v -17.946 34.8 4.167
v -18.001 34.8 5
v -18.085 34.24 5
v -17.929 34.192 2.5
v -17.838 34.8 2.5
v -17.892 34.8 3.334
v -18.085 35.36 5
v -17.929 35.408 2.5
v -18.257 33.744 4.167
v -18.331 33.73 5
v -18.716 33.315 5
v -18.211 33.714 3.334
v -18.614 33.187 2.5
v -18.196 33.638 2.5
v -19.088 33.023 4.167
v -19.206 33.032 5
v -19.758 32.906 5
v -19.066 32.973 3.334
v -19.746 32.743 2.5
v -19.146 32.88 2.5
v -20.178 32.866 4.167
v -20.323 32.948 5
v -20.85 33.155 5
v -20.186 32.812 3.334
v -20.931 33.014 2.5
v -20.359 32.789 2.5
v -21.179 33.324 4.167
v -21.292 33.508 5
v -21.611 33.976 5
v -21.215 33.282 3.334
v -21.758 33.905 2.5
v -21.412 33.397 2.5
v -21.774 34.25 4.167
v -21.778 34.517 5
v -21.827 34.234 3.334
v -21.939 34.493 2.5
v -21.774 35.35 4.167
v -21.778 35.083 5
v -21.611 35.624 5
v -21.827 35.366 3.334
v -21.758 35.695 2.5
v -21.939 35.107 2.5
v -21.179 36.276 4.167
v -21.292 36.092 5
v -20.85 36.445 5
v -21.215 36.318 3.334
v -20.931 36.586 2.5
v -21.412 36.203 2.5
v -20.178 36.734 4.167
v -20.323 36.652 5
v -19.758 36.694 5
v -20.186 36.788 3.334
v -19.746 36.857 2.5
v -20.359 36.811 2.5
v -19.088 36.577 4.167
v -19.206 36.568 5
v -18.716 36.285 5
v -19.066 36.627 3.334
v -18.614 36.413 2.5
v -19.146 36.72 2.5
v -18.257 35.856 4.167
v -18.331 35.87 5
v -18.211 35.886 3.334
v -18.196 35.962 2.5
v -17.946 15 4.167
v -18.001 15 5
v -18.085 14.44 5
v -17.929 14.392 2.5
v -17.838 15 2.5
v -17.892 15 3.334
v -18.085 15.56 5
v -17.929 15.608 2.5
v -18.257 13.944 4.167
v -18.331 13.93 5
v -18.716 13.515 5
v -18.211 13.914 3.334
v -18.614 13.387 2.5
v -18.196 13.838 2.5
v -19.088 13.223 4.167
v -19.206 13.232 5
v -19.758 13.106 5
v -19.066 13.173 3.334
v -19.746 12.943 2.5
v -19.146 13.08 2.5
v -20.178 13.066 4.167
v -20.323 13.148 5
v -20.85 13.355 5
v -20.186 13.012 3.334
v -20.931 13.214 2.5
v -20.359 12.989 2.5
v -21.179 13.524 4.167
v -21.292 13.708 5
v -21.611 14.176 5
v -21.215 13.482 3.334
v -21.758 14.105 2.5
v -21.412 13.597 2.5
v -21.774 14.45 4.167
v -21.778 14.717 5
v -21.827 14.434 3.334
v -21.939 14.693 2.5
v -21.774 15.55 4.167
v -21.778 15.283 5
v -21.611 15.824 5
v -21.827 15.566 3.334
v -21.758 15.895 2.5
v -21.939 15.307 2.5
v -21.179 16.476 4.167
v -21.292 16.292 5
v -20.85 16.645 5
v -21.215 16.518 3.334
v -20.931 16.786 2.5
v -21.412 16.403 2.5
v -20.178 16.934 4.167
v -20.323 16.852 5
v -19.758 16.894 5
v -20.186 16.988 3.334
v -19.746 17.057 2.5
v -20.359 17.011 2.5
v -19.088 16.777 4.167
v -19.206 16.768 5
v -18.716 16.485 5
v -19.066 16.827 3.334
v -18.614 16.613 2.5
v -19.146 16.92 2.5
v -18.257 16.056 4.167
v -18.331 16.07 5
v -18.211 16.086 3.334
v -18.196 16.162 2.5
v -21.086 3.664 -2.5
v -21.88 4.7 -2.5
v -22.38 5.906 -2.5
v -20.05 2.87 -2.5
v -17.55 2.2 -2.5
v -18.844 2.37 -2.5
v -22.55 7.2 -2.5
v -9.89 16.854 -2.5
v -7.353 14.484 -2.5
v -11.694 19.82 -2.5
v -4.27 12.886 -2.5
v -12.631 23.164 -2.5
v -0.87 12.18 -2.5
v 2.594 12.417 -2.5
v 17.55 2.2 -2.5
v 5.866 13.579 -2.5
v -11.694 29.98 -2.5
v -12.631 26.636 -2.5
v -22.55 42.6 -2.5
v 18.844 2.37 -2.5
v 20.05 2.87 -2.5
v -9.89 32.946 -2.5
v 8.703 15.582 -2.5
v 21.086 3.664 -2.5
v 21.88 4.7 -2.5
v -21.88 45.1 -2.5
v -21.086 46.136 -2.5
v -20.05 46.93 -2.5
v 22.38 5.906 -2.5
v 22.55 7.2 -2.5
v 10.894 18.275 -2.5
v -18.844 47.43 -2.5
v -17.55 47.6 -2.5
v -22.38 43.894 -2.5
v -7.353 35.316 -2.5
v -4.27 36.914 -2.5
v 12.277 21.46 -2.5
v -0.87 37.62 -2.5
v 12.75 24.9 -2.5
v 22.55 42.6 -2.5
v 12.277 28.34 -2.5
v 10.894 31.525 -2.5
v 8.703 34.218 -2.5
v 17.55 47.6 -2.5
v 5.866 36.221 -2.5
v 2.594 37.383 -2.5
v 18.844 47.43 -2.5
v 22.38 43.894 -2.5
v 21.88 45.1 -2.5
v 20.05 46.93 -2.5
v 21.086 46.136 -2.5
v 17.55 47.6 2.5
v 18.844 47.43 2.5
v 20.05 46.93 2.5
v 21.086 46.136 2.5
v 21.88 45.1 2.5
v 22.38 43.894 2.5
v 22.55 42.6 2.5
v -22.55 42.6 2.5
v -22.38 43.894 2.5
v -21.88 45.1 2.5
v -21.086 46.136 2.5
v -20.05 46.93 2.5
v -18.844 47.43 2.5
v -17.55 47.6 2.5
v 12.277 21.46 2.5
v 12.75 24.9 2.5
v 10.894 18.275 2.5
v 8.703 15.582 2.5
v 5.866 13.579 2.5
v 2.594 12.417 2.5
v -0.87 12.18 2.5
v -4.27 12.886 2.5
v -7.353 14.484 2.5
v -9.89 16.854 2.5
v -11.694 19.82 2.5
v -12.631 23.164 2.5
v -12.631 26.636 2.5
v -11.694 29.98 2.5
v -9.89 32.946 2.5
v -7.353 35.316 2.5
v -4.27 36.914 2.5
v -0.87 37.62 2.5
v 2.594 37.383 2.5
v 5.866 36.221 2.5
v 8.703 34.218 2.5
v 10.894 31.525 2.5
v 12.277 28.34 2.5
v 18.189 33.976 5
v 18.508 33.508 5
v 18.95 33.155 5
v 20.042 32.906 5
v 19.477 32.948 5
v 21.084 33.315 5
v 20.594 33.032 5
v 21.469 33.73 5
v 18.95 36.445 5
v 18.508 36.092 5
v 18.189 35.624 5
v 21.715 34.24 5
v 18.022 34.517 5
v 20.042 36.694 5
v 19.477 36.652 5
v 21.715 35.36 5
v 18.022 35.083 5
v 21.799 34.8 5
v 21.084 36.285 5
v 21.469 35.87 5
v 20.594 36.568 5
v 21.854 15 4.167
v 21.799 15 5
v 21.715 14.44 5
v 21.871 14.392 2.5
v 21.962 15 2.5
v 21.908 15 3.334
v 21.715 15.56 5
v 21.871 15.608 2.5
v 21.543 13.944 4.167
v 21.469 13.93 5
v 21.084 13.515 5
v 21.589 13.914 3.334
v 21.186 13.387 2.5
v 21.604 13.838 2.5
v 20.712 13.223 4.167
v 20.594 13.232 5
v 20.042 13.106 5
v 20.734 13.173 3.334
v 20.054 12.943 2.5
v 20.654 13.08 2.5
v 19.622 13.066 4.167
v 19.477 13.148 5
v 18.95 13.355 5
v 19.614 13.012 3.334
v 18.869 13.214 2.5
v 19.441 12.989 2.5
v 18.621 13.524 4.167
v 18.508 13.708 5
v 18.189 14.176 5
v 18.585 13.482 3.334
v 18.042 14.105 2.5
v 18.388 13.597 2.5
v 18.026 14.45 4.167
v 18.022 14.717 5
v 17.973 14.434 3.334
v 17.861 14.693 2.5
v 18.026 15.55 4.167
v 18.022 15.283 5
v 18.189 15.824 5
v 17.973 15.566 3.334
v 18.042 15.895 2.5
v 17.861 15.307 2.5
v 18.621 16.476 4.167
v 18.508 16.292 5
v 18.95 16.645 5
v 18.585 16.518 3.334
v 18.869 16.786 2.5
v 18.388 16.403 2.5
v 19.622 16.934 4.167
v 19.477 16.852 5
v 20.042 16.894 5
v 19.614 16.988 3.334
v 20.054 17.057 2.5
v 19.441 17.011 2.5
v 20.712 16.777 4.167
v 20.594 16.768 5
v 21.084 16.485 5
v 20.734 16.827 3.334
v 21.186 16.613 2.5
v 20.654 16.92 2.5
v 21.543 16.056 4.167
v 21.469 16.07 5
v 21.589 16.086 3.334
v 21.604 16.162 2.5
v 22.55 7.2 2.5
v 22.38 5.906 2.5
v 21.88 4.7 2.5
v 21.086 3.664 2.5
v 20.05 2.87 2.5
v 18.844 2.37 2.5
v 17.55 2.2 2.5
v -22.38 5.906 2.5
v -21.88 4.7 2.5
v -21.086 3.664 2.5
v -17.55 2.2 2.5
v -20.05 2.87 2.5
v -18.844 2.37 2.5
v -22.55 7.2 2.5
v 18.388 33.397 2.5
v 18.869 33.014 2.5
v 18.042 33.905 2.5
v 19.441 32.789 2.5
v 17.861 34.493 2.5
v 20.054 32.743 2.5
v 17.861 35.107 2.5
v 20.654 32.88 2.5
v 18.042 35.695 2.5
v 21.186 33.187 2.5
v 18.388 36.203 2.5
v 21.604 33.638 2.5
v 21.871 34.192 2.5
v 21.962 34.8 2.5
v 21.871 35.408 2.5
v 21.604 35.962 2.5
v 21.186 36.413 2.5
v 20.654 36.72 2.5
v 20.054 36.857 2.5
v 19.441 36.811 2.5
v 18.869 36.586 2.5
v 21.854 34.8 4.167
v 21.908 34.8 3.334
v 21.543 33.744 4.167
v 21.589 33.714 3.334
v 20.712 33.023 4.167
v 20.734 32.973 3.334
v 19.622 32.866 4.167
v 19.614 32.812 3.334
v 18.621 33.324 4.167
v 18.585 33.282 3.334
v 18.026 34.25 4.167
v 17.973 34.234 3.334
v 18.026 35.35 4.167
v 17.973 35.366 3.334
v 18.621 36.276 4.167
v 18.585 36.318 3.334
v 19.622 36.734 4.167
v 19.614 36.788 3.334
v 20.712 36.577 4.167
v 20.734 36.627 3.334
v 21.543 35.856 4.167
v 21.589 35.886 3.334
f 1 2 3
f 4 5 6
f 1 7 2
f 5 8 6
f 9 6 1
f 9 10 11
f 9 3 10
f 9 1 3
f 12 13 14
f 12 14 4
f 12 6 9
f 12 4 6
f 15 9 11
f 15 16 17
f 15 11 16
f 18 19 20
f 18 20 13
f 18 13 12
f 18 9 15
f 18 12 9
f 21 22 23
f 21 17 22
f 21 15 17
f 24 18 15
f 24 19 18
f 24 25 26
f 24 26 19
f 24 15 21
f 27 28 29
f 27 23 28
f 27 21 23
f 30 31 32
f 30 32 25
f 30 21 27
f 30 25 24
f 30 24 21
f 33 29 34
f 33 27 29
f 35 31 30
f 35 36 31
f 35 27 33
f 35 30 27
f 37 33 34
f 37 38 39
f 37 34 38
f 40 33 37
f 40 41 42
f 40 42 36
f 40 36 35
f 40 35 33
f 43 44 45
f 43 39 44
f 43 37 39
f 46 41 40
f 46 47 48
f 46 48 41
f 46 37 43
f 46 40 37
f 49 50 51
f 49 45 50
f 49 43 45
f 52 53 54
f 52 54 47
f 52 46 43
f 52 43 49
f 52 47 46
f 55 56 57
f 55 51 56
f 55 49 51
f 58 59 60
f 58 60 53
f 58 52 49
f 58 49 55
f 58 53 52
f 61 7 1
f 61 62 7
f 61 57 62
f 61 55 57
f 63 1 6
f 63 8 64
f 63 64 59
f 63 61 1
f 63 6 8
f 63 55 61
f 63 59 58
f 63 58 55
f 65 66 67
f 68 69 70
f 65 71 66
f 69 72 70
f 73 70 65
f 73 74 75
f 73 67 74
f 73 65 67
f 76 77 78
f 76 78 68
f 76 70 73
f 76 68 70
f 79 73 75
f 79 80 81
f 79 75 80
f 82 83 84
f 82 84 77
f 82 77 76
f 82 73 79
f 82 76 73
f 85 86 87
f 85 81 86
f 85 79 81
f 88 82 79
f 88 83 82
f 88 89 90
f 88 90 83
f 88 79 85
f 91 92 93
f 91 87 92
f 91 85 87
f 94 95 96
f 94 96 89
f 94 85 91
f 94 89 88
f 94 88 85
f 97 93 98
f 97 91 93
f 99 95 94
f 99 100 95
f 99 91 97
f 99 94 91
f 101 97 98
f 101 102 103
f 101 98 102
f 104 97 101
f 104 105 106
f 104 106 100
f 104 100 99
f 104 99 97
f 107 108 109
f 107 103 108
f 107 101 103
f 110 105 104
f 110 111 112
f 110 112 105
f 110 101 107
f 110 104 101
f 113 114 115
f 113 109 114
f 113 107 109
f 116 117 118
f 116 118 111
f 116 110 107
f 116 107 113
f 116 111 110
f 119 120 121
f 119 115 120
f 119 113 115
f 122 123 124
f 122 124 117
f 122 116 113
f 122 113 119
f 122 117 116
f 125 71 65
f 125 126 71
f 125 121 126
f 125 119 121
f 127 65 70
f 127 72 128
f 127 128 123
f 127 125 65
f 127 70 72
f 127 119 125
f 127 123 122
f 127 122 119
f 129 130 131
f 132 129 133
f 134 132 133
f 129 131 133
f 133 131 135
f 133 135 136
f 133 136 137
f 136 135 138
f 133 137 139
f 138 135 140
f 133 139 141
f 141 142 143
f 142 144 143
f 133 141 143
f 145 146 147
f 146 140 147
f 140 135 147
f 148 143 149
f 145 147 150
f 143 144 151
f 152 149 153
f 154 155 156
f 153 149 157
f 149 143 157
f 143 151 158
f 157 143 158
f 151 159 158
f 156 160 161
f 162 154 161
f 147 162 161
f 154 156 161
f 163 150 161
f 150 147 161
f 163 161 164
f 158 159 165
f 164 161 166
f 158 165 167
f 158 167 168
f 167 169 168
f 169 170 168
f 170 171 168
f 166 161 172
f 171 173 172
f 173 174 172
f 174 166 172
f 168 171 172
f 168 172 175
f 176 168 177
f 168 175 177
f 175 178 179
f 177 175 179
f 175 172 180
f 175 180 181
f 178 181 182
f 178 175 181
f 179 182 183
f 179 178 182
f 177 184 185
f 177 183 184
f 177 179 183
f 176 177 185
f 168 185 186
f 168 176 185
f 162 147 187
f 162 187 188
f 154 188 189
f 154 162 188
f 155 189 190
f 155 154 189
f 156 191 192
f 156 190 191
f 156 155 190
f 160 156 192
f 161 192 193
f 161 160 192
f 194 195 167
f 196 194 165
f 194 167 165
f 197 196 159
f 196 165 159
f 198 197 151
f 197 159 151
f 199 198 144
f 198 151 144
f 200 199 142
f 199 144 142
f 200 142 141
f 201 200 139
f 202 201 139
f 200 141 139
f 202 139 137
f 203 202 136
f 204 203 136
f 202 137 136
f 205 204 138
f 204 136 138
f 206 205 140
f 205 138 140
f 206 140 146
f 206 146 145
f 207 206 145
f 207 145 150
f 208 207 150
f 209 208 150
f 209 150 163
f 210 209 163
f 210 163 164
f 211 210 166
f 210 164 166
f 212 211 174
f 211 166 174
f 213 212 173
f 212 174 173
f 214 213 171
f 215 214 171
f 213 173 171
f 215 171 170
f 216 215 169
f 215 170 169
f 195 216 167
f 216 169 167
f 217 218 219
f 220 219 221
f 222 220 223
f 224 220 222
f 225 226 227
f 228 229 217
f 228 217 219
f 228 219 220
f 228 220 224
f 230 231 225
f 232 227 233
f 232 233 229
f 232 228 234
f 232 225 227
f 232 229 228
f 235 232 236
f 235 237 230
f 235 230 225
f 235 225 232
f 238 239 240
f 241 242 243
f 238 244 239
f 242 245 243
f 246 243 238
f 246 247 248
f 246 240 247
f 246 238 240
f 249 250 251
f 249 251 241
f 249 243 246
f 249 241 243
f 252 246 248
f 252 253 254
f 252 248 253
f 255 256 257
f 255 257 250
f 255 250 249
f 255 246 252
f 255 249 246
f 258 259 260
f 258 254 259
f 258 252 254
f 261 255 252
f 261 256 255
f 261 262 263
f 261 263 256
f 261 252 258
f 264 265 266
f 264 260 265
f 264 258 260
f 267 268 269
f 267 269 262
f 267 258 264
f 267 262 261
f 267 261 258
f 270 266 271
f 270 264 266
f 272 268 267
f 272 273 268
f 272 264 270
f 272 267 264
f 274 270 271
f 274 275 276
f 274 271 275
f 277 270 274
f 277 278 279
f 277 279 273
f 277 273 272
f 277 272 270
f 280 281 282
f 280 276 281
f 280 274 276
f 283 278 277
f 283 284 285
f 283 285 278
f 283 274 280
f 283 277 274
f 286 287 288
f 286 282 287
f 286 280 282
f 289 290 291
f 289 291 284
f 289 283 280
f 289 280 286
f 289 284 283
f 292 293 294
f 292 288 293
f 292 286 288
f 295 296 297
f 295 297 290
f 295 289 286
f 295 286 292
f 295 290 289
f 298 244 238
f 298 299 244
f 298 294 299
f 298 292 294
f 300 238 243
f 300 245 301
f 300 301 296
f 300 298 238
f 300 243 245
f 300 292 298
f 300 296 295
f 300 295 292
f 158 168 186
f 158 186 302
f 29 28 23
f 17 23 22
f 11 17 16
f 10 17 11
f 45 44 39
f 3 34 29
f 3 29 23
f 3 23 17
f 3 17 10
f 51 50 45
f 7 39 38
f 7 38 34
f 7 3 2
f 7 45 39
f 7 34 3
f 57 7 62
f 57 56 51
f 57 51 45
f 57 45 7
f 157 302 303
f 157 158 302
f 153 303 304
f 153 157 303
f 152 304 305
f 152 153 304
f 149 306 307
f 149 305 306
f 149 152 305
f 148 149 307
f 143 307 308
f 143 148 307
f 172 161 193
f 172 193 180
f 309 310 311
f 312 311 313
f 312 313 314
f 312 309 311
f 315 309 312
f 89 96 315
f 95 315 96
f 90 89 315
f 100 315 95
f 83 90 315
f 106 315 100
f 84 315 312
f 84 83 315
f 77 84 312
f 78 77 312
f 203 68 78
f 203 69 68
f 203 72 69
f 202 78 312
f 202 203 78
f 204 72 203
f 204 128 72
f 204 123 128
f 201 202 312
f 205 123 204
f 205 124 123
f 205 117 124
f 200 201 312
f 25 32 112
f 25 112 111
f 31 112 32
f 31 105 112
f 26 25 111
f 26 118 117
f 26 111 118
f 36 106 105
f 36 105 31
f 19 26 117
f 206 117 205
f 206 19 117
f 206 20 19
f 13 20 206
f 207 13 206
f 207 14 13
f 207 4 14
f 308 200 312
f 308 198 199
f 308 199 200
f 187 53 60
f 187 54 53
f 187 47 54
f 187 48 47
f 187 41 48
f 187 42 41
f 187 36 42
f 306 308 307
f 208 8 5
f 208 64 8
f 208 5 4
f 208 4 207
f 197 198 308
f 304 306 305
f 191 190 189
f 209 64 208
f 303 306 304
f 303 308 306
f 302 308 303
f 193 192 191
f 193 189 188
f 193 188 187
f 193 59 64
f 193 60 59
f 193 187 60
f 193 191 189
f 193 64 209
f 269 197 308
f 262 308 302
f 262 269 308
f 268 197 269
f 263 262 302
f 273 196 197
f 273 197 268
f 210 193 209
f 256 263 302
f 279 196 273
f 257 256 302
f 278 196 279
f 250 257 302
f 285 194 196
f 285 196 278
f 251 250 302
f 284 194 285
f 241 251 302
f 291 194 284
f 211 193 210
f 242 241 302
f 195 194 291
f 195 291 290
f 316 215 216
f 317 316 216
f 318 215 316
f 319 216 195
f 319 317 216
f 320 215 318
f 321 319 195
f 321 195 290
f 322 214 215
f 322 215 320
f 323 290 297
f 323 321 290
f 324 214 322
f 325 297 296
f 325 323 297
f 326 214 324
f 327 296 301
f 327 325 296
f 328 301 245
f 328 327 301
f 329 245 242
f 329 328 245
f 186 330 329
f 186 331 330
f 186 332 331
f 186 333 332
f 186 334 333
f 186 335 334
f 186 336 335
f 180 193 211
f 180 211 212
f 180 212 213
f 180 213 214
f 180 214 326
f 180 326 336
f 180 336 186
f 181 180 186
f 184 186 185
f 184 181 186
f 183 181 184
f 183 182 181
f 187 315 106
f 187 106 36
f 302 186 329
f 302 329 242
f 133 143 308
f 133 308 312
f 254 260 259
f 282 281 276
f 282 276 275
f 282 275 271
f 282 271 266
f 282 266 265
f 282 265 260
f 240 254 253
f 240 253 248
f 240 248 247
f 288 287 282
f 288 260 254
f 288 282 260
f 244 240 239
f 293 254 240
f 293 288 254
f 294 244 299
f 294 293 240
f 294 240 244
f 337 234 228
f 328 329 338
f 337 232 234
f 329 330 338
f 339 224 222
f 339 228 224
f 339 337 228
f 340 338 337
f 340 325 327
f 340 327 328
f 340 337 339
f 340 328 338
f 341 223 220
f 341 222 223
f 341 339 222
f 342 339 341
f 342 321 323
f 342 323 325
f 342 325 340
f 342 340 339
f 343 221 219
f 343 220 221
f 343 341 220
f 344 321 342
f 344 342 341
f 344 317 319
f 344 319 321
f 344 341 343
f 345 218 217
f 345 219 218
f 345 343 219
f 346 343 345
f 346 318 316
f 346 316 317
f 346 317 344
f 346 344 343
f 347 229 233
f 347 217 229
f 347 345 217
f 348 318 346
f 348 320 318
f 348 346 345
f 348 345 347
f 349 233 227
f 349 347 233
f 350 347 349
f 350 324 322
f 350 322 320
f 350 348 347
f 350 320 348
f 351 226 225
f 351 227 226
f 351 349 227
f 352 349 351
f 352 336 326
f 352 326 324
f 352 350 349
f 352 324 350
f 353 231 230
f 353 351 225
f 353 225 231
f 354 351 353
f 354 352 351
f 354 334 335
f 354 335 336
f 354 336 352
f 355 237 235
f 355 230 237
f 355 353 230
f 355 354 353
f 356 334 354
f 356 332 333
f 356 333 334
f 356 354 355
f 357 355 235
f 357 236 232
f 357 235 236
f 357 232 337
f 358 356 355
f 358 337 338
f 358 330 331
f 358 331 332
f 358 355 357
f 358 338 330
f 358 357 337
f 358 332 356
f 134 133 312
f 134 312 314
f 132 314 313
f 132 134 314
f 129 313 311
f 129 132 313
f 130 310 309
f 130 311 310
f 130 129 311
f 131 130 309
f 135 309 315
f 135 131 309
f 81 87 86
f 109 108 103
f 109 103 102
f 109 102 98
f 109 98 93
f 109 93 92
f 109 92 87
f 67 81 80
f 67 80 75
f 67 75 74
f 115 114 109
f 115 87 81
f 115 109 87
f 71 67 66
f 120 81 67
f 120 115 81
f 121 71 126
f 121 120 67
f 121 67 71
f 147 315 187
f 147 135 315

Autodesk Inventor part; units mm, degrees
ref_plane "YZ Plane" through (0, 0, 0) normal (1, 0, 0) x (0, 1, 0)
ref_plane "XZ Plane" through (0, 0, 0) normal (0, 1, 0) x (-1, 0, 0)
ref_plane "XY Plane" through (0, 0, 0) normal (0, 0, 1) x (1, 0, 0)
sketch "Sketch1" plane through (0, 0, 0) normal (0, 0, 1) x (1, 0, 0)
  line L0 (22.9, 0.025) -> (-22.9, 0.025) projected
  line L1 (22.9, 42.1) -> (22.9, 0.025) projected
  line L2 (22.9, 42.1) -> (17.05, 42.1) projected
  line L3 (17.05, 7.7) -> (17.05, 42.1) projected
  line L4 (-17.05, 7.7) -> (17.05, 7.7) projected
  line L5 (-17.05, 7.7) -> (-17.05, 42.1) projected
  line L6 (-17.05, 42.1) -> (-22.9, 42.1) projected
  line L7 (-22.9, 0.025) -> (-22.9, 42.1) projected
  circle A0 centre (19.9, 34.8) radius 2.0625 projected
  circle A1 centre (-19.9, 34.8) radius 2.0625 projected
  circle A2 centre (19.9, 15) radius 2.0625 projected
  circle A3 centre (-19.9, 15) radius 2.0625 projected
  circle A4 centre (10, 3.85) radius 1.5625 projected
  circle A5 centre (-10, 3.85) radius 1.5625 projected
  line L8 (-17.05, 7.7) -> (17.05, 7.7)
  line L9 (17.05, 7.7) -> (17.05, 42.1)
  line L10 (17.05, 42.1) -> (-17.05, 42.1)
  line L11 (-17.05, 42.1) -> (-17.05, 7.7)
  line L12 (-17.55, 47.6) -> (17.55, 47.6)
  line L13 (22.55, 42.6) -> (22.55, 7.2)
  line L14 (17.55, 2.2) -> (-17.55, 2.2)
  line L15 (-22.55, 7.2) -> (-22.55, 42.6)
  line L16 (-22.55, 24.9) -> (22.55, 24.9)
  circle A6 centre (0, 24.9) radius 12.75
  arc A7 (-17.55, 47.6) -> (-22.55, 42.6) centre (-17.55, 42.6) ccw
  arc A8 (22.55, 42.6) -> (17.55, 47.6) centre (17.55, 42.6) ccw
  arc A9 (17.55, 2.2) -> (22.55, 7.2) centre (17.55, 7.2) ccw
  arc A10 (-22.55, 7.2) -> (-17.55, 2.2) centre (-17.55, 7.2) ccw
  point P0 (0, 0)
  dimension "d0" = 5.5
  dimension "d1" = 25.5
  dimension "d2" = 5
extrude "Extrusion1" add sketch "Sketch1" along normal mid plane 5 contours L13 L16 L3 L2 | L2 L10 L6 L15 A7 L12 A8 L13 | L6 L5 L16 L15 | L3 L16 A6 L5 L10 | L13 A9 L14 A10 L15 L16 L5 L4 L3 | L3 L4 L5 L16 A6 | A0 | A1 | A2 | A3 | A4 | A5
sketch "Sketch2" plane through (0, 0, 2.5) normal (0, 0, 1) x (1, 0, 0)
  line L0 (22.9, 0.025) -> (-22.9, 0.025) projected
  line L1 (22.9, 42.1) -> (22.9, 0.025) projected
  line L2 (22.9, 42.1) -> (17.05, 42.1) projected
  line L3 (17.05, 7.7) -> (17.05, 42.1) projected
  line L4 (-17.05, 7.7) -> (17.05, 7.7) projected
  line L5 (-17.05, 7.7) -> (-17.05, 42.1) projected
  line L6 (-17.05, 42.1) -> (-22.9, 42.1) projected
  line L7 (-22.9, 0.025) -> (-22.9, 42.1) projected
  circle A0 centre (19.9, 34.8) radius 2.0625 projected
  circle A1 centre (-19.9, 34.8) radius 2.0625 projected
  circle A2 centre (19.9, 15) radius 2.0625 projected
  circle A3 centre (-19.9, 15) radius 2.0625 projected
  circle A4 centre (10, 3.85) radius 1.5625 projected
  circle A5 centre (-10, 3.85) radius 1.5625 projected
  point P0 (0, 0)
extrude "Extrusion2" add sketch "Sketch2" along normal blind 2.5 contours A0 | A1 | A2 | A3
chamfer "Chamfer1" distance 2.5 angle 3.75 1 edges at (17.8375, 34.8, 5) measured on face at (21.7975, 35.6084, 4.1667)
chamfer "Chamfer2" distance 2.5 angle 3.75 1 edges at (17.8375, 15, 5) measured on face at (21.9358, 14.6692, 4.1667)
chamfer "Chamfer3" distance 2.5 angle 3.75 1 edges at (-21.9625, 34.8, 5) measured on face at (-18.0025, 35.6084, 4.1667)
chamfer "Chamfer4" distance 2.5 angle 3.75 1 edges at (-21.9625, 15, 5) measured on face at (-17.8642, 14.6692, 4.1667)
properties part number "Filter Mount"
